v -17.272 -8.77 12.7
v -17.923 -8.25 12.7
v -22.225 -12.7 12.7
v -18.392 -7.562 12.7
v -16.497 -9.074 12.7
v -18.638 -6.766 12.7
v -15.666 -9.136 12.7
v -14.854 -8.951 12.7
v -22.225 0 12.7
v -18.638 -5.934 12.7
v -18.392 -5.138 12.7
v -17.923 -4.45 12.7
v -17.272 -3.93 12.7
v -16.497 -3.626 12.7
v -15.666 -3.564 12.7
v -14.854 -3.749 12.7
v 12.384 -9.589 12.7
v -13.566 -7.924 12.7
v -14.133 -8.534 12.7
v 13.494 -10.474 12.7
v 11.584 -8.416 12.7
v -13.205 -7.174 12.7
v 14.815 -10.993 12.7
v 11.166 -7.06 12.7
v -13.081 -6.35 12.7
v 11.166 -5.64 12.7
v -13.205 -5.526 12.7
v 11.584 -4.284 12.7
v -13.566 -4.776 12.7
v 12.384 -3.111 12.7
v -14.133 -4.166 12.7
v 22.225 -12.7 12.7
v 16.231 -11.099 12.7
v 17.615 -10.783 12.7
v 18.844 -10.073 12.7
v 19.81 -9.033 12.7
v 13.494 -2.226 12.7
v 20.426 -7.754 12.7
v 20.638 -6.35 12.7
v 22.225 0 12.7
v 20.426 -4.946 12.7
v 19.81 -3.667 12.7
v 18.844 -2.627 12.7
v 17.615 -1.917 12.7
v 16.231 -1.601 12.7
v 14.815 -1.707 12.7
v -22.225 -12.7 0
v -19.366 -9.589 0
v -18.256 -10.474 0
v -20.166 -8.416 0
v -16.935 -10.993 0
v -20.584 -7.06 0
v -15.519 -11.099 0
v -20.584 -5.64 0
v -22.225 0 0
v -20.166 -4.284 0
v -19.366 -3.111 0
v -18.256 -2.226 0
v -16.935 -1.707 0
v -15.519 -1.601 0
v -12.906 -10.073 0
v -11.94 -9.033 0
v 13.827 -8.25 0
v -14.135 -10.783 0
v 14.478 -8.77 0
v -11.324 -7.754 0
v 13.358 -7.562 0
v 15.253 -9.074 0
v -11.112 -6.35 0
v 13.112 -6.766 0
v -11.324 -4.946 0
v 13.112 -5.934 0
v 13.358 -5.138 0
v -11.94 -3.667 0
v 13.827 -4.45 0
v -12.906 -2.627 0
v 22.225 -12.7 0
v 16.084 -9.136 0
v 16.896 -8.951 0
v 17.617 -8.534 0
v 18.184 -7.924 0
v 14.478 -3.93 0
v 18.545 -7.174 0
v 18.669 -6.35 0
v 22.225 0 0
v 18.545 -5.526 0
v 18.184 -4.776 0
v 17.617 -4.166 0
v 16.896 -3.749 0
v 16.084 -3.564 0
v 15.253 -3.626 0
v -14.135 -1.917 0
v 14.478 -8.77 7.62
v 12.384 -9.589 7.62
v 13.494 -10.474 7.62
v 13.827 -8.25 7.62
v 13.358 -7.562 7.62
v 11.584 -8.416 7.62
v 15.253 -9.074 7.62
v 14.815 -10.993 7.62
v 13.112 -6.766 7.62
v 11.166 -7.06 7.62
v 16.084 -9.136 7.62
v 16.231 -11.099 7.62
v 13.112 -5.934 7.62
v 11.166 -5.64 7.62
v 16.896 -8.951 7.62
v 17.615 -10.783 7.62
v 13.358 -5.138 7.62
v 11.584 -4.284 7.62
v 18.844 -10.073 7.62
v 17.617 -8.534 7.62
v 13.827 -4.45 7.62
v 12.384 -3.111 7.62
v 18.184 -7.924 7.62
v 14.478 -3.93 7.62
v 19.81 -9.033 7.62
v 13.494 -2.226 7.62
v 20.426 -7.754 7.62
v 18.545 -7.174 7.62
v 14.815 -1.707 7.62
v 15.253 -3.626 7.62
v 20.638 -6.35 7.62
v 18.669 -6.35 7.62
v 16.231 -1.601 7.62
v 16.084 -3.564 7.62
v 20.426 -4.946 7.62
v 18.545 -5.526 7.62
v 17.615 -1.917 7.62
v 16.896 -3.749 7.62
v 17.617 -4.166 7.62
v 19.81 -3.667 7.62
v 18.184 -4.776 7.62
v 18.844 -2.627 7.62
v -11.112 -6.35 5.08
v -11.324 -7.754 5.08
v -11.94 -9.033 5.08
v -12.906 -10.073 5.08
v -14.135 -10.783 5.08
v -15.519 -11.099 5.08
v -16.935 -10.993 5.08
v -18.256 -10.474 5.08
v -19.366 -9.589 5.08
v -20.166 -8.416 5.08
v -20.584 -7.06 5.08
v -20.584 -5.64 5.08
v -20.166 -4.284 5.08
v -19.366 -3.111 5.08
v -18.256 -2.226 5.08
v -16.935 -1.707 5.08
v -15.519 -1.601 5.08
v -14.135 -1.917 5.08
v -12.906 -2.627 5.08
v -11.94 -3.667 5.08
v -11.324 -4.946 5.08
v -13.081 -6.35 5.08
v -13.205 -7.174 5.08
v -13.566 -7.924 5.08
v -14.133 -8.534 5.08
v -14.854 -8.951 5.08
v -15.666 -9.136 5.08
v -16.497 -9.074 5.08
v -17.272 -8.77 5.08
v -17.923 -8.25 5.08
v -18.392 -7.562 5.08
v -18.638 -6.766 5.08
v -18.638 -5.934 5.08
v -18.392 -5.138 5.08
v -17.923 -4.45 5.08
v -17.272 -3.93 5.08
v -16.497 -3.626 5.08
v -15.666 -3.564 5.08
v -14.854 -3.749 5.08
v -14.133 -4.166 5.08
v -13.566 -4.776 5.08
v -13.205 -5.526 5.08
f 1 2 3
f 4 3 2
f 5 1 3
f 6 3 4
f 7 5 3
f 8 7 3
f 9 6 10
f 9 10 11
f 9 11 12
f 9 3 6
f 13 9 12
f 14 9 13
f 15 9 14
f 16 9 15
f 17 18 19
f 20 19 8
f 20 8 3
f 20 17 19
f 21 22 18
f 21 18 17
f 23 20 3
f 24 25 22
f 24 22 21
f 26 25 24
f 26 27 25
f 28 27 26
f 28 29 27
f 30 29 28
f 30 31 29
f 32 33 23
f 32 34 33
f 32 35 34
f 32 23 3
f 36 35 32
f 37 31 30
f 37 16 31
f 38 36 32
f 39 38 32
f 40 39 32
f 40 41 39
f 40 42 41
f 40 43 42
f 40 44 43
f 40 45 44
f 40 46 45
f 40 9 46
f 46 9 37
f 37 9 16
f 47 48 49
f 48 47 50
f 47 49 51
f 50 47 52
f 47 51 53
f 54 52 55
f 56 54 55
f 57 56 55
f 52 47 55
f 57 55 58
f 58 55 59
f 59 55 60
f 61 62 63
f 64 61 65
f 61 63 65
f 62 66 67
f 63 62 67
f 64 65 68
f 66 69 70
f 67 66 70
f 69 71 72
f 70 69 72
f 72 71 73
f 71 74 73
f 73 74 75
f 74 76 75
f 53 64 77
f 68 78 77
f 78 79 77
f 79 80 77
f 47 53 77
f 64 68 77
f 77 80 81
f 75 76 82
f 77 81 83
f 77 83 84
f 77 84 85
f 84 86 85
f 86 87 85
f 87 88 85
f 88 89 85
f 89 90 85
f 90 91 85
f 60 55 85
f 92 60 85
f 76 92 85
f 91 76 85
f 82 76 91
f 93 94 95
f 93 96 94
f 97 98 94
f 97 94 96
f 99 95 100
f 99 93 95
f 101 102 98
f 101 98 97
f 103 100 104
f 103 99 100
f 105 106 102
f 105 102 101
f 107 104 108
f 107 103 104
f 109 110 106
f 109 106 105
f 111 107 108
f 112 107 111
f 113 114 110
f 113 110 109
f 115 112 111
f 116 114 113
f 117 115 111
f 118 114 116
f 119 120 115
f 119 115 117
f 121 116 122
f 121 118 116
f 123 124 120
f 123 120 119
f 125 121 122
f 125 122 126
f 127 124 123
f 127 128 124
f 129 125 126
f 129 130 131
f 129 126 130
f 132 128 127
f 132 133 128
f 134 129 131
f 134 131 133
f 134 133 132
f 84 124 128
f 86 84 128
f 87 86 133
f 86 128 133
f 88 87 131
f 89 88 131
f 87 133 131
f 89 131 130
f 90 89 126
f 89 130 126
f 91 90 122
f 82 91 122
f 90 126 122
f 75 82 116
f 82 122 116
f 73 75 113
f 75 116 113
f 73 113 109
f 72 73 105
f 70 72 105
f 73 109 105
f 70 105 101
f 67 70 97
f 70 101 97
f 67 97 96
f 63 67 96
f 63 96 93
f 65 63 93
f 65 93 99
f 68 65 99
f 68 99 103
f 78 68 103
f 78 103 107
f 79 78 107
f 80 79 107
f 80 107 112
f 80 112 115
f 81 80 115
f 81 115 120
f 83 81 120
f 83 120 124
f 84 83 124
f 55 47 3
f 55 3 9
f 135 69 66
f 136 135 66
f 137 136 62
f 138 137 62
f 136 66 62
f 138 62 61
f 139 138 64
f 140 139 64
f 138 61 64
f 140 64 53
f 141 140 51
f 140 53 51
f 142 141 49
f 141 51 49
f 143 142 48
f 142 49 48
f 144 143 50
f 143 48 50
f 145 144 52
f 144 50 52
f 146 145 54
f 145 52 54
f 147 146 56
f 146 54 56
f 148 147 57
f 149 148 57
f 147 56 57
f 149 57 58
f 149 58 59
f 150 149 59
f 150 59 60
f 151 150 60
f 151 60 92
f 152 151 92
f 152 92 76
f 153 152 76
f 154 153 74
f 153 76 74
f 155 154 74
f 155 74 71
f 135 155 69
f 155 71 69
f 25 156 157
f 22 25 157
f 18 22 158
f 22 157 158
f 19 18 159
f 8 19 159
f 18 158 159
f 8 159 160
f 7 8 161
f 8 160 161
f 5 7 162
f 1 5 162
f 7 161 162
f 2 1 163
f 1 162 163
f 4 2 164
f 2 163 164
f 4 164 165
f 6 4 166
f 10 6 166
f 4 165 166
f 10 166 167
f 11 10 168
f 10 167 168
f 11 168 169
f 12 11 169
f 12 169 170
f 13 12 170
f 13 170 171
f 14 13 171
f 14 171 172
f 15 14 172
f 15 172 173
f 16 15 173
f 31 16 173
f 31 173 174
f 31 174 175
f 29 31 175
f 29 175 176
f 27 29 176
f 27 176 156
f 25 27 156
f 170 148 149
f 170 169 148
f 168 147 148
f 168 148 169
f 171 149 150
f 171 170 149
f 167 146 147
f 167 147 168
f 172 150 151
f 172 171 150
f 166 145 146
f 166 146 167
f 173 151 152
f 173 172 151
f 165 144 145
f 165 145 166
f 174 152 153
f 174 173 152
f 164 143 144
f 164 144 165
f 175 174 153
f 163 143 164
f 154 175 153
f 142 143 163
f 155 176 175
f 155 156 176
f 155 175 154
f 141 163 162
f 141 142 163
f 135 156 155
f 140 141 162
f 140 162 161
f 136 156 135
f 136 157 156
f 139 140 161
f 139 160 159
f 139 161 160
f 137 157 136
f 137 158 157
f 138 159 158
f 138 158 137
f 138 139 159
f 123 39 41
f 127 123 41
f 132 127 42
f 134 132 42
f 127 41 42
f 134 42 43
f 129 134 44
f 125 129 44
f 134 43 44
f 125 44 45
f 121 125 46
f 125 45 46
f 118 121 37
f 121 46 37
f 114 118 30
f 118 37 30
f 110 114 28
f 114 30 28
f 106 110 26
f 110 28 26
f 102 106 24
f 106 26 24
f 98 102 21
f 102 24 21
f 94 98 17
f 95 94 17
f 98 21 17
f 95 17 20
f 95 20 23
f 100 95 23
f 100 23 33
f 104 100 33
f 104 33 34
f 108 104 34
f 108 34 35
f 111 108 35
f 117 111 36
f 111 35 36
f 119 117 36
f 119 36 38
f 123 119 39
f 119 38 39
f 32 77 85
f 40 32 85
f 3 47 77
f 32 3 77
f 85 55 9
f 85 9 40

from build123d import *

# Parameters (mm, degrees)
F0_W     = 44.45
F0_H     = 12.7
F1_DEPTH = 12.7
F2_R     = 2.794
F3_DEPTH = 12.701
F4_R     = 2.794
F5_DEPTH = 12.701
F6_R     = 4.7625
F7_DEPTH = 5.08
F8_R     = 4.7625
F9_DEPTH = 5.08


with BuildPart() as f1:
    # F0 (on Top) → F1 (new body)
    with BuildSketch(Plane.XY):
        with Locations((0, -6.35)):
            Rectangle(F0_W, F0_H)
    extrude(amount=F1_DEPTH)

    # F2 (on face) → F3 (cut, through all)
    with BuildSketch(Plane.XY.offset(12.7)):
        with Locations((15.875, -6.35)):
            Circle(F2_R)
    extrude(amount=-F3_DEPTH, mode=Mode.SUBTRACT)

    # F4 (on face) → F5 (cut, through all)
    with BuildSketch(Plane(origin=(0, 0, 0), x_dir=(1, 0, 0), z_dir=(0, 0, -1))):
        with Locations((-15.875, 6.35)):
            Circle(F4_R)
    extrude(amount=-F5_DEPTH, mode=Mode.SUBTRACT)

    # F6 (on face) → F7 (cut)
    with BuildSketch(Plane.XY.offset(12.7)):
        with Locations((15.875, -6.35)):
            Circle(F6_R)
    extrude(amount=-F7_DEPTH, mode=Mode.SUBTRACT)

    # F8 (on face) → F9 (cut)
    with BuildSketch(Plane(origin=(0, 0, 0), x_dir=(1, 0, 0), z_dir=(0, 0, -1))):
        with Locations((-15.875, 6.35)):
            Circle(F8_R)
    extrude(amount=-F9_DEPTH, mode=Mode.SUBTRACT)


solid = f1.part
